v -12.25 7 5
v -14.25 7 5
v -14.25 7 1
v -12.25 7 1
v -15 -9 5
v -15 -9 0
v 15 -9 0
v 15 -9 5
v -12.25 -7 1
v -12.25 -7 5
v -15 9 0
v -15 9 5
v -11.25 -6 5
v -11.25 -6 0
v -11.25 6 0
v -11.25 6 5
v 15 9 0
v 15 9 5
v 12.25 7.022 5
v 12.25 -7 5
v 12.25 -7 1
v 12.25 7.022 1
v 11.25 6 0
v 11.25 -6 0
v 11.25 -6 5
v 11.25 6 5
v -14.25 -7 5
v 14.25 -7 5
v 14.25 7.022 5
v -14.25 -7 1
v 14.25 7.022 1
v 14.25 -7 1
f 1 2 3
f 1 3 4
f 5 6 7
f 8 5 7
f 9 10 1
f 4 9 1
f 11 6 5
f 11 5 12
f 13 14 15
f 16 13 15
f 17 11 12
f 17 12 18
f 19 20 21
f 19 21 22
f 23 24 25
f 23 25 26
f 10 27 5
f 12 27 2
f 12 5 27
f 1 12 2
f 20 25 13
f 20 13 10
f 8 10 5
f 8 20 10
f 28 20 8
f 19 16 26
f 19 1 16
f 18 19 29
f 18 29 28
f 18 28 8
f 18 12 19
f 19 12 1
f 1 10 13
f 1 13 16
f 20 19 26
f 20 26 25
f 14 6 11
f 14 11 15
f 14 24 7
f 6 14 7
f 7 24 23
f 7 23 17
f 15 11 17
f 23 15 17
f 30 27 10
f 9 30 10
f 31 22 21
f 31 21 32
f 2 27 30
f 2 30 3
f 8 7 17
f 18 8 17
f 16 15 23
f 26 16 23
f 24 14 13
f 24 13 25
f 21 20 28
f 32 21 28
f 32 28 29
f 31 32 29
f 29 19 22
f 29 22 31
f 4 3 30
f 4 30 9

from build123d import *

# Parameters (mm, degrees)
SKETCH1_W           = 30
SKETCH1_H           = 18
SKETCH1_W_2         = 22.5
SKETCH1_H_2         = 12
BOSS_EXTRUDE2_DEPTH = 5
SKETCH2_W           = 2
SKETCH2_H           = 14
SKETCH2_H_2         = 14.02224411
CUT_EXTRUDE1_DEPTH  = 4


with BuildPart() as part:
    # Sketch1 → Boss-Extrude2 (new body)
    with BuildSketch(Plane.XY):
        Rectangle(SKETCH1_W, SKETCH1_H)
        Rectangle(SKETCH1_W_2, SKETCH1_H_2, mode=Mode.SUBTRACT)
    extrude(amount=BOSS_EXTRUDE2_DEPTH)

    # Sketch2 → Cut-Extrude1 (cut)
    with BuildSketch(Plane.XY.offset(5)):
        with Locations((-13.25, 0)):
            Rectangle(SKETCH2_W, SKETCH2_H)
        with Locations((13.25, 0.011122055)):
            Rectangle(SKETCH2_W, SKETCH2_H_2)
    extrude(amount=-CUT_EXTRUDE1_DEPTH, mode=Mode.SUBTRACT)


solid = part.part
